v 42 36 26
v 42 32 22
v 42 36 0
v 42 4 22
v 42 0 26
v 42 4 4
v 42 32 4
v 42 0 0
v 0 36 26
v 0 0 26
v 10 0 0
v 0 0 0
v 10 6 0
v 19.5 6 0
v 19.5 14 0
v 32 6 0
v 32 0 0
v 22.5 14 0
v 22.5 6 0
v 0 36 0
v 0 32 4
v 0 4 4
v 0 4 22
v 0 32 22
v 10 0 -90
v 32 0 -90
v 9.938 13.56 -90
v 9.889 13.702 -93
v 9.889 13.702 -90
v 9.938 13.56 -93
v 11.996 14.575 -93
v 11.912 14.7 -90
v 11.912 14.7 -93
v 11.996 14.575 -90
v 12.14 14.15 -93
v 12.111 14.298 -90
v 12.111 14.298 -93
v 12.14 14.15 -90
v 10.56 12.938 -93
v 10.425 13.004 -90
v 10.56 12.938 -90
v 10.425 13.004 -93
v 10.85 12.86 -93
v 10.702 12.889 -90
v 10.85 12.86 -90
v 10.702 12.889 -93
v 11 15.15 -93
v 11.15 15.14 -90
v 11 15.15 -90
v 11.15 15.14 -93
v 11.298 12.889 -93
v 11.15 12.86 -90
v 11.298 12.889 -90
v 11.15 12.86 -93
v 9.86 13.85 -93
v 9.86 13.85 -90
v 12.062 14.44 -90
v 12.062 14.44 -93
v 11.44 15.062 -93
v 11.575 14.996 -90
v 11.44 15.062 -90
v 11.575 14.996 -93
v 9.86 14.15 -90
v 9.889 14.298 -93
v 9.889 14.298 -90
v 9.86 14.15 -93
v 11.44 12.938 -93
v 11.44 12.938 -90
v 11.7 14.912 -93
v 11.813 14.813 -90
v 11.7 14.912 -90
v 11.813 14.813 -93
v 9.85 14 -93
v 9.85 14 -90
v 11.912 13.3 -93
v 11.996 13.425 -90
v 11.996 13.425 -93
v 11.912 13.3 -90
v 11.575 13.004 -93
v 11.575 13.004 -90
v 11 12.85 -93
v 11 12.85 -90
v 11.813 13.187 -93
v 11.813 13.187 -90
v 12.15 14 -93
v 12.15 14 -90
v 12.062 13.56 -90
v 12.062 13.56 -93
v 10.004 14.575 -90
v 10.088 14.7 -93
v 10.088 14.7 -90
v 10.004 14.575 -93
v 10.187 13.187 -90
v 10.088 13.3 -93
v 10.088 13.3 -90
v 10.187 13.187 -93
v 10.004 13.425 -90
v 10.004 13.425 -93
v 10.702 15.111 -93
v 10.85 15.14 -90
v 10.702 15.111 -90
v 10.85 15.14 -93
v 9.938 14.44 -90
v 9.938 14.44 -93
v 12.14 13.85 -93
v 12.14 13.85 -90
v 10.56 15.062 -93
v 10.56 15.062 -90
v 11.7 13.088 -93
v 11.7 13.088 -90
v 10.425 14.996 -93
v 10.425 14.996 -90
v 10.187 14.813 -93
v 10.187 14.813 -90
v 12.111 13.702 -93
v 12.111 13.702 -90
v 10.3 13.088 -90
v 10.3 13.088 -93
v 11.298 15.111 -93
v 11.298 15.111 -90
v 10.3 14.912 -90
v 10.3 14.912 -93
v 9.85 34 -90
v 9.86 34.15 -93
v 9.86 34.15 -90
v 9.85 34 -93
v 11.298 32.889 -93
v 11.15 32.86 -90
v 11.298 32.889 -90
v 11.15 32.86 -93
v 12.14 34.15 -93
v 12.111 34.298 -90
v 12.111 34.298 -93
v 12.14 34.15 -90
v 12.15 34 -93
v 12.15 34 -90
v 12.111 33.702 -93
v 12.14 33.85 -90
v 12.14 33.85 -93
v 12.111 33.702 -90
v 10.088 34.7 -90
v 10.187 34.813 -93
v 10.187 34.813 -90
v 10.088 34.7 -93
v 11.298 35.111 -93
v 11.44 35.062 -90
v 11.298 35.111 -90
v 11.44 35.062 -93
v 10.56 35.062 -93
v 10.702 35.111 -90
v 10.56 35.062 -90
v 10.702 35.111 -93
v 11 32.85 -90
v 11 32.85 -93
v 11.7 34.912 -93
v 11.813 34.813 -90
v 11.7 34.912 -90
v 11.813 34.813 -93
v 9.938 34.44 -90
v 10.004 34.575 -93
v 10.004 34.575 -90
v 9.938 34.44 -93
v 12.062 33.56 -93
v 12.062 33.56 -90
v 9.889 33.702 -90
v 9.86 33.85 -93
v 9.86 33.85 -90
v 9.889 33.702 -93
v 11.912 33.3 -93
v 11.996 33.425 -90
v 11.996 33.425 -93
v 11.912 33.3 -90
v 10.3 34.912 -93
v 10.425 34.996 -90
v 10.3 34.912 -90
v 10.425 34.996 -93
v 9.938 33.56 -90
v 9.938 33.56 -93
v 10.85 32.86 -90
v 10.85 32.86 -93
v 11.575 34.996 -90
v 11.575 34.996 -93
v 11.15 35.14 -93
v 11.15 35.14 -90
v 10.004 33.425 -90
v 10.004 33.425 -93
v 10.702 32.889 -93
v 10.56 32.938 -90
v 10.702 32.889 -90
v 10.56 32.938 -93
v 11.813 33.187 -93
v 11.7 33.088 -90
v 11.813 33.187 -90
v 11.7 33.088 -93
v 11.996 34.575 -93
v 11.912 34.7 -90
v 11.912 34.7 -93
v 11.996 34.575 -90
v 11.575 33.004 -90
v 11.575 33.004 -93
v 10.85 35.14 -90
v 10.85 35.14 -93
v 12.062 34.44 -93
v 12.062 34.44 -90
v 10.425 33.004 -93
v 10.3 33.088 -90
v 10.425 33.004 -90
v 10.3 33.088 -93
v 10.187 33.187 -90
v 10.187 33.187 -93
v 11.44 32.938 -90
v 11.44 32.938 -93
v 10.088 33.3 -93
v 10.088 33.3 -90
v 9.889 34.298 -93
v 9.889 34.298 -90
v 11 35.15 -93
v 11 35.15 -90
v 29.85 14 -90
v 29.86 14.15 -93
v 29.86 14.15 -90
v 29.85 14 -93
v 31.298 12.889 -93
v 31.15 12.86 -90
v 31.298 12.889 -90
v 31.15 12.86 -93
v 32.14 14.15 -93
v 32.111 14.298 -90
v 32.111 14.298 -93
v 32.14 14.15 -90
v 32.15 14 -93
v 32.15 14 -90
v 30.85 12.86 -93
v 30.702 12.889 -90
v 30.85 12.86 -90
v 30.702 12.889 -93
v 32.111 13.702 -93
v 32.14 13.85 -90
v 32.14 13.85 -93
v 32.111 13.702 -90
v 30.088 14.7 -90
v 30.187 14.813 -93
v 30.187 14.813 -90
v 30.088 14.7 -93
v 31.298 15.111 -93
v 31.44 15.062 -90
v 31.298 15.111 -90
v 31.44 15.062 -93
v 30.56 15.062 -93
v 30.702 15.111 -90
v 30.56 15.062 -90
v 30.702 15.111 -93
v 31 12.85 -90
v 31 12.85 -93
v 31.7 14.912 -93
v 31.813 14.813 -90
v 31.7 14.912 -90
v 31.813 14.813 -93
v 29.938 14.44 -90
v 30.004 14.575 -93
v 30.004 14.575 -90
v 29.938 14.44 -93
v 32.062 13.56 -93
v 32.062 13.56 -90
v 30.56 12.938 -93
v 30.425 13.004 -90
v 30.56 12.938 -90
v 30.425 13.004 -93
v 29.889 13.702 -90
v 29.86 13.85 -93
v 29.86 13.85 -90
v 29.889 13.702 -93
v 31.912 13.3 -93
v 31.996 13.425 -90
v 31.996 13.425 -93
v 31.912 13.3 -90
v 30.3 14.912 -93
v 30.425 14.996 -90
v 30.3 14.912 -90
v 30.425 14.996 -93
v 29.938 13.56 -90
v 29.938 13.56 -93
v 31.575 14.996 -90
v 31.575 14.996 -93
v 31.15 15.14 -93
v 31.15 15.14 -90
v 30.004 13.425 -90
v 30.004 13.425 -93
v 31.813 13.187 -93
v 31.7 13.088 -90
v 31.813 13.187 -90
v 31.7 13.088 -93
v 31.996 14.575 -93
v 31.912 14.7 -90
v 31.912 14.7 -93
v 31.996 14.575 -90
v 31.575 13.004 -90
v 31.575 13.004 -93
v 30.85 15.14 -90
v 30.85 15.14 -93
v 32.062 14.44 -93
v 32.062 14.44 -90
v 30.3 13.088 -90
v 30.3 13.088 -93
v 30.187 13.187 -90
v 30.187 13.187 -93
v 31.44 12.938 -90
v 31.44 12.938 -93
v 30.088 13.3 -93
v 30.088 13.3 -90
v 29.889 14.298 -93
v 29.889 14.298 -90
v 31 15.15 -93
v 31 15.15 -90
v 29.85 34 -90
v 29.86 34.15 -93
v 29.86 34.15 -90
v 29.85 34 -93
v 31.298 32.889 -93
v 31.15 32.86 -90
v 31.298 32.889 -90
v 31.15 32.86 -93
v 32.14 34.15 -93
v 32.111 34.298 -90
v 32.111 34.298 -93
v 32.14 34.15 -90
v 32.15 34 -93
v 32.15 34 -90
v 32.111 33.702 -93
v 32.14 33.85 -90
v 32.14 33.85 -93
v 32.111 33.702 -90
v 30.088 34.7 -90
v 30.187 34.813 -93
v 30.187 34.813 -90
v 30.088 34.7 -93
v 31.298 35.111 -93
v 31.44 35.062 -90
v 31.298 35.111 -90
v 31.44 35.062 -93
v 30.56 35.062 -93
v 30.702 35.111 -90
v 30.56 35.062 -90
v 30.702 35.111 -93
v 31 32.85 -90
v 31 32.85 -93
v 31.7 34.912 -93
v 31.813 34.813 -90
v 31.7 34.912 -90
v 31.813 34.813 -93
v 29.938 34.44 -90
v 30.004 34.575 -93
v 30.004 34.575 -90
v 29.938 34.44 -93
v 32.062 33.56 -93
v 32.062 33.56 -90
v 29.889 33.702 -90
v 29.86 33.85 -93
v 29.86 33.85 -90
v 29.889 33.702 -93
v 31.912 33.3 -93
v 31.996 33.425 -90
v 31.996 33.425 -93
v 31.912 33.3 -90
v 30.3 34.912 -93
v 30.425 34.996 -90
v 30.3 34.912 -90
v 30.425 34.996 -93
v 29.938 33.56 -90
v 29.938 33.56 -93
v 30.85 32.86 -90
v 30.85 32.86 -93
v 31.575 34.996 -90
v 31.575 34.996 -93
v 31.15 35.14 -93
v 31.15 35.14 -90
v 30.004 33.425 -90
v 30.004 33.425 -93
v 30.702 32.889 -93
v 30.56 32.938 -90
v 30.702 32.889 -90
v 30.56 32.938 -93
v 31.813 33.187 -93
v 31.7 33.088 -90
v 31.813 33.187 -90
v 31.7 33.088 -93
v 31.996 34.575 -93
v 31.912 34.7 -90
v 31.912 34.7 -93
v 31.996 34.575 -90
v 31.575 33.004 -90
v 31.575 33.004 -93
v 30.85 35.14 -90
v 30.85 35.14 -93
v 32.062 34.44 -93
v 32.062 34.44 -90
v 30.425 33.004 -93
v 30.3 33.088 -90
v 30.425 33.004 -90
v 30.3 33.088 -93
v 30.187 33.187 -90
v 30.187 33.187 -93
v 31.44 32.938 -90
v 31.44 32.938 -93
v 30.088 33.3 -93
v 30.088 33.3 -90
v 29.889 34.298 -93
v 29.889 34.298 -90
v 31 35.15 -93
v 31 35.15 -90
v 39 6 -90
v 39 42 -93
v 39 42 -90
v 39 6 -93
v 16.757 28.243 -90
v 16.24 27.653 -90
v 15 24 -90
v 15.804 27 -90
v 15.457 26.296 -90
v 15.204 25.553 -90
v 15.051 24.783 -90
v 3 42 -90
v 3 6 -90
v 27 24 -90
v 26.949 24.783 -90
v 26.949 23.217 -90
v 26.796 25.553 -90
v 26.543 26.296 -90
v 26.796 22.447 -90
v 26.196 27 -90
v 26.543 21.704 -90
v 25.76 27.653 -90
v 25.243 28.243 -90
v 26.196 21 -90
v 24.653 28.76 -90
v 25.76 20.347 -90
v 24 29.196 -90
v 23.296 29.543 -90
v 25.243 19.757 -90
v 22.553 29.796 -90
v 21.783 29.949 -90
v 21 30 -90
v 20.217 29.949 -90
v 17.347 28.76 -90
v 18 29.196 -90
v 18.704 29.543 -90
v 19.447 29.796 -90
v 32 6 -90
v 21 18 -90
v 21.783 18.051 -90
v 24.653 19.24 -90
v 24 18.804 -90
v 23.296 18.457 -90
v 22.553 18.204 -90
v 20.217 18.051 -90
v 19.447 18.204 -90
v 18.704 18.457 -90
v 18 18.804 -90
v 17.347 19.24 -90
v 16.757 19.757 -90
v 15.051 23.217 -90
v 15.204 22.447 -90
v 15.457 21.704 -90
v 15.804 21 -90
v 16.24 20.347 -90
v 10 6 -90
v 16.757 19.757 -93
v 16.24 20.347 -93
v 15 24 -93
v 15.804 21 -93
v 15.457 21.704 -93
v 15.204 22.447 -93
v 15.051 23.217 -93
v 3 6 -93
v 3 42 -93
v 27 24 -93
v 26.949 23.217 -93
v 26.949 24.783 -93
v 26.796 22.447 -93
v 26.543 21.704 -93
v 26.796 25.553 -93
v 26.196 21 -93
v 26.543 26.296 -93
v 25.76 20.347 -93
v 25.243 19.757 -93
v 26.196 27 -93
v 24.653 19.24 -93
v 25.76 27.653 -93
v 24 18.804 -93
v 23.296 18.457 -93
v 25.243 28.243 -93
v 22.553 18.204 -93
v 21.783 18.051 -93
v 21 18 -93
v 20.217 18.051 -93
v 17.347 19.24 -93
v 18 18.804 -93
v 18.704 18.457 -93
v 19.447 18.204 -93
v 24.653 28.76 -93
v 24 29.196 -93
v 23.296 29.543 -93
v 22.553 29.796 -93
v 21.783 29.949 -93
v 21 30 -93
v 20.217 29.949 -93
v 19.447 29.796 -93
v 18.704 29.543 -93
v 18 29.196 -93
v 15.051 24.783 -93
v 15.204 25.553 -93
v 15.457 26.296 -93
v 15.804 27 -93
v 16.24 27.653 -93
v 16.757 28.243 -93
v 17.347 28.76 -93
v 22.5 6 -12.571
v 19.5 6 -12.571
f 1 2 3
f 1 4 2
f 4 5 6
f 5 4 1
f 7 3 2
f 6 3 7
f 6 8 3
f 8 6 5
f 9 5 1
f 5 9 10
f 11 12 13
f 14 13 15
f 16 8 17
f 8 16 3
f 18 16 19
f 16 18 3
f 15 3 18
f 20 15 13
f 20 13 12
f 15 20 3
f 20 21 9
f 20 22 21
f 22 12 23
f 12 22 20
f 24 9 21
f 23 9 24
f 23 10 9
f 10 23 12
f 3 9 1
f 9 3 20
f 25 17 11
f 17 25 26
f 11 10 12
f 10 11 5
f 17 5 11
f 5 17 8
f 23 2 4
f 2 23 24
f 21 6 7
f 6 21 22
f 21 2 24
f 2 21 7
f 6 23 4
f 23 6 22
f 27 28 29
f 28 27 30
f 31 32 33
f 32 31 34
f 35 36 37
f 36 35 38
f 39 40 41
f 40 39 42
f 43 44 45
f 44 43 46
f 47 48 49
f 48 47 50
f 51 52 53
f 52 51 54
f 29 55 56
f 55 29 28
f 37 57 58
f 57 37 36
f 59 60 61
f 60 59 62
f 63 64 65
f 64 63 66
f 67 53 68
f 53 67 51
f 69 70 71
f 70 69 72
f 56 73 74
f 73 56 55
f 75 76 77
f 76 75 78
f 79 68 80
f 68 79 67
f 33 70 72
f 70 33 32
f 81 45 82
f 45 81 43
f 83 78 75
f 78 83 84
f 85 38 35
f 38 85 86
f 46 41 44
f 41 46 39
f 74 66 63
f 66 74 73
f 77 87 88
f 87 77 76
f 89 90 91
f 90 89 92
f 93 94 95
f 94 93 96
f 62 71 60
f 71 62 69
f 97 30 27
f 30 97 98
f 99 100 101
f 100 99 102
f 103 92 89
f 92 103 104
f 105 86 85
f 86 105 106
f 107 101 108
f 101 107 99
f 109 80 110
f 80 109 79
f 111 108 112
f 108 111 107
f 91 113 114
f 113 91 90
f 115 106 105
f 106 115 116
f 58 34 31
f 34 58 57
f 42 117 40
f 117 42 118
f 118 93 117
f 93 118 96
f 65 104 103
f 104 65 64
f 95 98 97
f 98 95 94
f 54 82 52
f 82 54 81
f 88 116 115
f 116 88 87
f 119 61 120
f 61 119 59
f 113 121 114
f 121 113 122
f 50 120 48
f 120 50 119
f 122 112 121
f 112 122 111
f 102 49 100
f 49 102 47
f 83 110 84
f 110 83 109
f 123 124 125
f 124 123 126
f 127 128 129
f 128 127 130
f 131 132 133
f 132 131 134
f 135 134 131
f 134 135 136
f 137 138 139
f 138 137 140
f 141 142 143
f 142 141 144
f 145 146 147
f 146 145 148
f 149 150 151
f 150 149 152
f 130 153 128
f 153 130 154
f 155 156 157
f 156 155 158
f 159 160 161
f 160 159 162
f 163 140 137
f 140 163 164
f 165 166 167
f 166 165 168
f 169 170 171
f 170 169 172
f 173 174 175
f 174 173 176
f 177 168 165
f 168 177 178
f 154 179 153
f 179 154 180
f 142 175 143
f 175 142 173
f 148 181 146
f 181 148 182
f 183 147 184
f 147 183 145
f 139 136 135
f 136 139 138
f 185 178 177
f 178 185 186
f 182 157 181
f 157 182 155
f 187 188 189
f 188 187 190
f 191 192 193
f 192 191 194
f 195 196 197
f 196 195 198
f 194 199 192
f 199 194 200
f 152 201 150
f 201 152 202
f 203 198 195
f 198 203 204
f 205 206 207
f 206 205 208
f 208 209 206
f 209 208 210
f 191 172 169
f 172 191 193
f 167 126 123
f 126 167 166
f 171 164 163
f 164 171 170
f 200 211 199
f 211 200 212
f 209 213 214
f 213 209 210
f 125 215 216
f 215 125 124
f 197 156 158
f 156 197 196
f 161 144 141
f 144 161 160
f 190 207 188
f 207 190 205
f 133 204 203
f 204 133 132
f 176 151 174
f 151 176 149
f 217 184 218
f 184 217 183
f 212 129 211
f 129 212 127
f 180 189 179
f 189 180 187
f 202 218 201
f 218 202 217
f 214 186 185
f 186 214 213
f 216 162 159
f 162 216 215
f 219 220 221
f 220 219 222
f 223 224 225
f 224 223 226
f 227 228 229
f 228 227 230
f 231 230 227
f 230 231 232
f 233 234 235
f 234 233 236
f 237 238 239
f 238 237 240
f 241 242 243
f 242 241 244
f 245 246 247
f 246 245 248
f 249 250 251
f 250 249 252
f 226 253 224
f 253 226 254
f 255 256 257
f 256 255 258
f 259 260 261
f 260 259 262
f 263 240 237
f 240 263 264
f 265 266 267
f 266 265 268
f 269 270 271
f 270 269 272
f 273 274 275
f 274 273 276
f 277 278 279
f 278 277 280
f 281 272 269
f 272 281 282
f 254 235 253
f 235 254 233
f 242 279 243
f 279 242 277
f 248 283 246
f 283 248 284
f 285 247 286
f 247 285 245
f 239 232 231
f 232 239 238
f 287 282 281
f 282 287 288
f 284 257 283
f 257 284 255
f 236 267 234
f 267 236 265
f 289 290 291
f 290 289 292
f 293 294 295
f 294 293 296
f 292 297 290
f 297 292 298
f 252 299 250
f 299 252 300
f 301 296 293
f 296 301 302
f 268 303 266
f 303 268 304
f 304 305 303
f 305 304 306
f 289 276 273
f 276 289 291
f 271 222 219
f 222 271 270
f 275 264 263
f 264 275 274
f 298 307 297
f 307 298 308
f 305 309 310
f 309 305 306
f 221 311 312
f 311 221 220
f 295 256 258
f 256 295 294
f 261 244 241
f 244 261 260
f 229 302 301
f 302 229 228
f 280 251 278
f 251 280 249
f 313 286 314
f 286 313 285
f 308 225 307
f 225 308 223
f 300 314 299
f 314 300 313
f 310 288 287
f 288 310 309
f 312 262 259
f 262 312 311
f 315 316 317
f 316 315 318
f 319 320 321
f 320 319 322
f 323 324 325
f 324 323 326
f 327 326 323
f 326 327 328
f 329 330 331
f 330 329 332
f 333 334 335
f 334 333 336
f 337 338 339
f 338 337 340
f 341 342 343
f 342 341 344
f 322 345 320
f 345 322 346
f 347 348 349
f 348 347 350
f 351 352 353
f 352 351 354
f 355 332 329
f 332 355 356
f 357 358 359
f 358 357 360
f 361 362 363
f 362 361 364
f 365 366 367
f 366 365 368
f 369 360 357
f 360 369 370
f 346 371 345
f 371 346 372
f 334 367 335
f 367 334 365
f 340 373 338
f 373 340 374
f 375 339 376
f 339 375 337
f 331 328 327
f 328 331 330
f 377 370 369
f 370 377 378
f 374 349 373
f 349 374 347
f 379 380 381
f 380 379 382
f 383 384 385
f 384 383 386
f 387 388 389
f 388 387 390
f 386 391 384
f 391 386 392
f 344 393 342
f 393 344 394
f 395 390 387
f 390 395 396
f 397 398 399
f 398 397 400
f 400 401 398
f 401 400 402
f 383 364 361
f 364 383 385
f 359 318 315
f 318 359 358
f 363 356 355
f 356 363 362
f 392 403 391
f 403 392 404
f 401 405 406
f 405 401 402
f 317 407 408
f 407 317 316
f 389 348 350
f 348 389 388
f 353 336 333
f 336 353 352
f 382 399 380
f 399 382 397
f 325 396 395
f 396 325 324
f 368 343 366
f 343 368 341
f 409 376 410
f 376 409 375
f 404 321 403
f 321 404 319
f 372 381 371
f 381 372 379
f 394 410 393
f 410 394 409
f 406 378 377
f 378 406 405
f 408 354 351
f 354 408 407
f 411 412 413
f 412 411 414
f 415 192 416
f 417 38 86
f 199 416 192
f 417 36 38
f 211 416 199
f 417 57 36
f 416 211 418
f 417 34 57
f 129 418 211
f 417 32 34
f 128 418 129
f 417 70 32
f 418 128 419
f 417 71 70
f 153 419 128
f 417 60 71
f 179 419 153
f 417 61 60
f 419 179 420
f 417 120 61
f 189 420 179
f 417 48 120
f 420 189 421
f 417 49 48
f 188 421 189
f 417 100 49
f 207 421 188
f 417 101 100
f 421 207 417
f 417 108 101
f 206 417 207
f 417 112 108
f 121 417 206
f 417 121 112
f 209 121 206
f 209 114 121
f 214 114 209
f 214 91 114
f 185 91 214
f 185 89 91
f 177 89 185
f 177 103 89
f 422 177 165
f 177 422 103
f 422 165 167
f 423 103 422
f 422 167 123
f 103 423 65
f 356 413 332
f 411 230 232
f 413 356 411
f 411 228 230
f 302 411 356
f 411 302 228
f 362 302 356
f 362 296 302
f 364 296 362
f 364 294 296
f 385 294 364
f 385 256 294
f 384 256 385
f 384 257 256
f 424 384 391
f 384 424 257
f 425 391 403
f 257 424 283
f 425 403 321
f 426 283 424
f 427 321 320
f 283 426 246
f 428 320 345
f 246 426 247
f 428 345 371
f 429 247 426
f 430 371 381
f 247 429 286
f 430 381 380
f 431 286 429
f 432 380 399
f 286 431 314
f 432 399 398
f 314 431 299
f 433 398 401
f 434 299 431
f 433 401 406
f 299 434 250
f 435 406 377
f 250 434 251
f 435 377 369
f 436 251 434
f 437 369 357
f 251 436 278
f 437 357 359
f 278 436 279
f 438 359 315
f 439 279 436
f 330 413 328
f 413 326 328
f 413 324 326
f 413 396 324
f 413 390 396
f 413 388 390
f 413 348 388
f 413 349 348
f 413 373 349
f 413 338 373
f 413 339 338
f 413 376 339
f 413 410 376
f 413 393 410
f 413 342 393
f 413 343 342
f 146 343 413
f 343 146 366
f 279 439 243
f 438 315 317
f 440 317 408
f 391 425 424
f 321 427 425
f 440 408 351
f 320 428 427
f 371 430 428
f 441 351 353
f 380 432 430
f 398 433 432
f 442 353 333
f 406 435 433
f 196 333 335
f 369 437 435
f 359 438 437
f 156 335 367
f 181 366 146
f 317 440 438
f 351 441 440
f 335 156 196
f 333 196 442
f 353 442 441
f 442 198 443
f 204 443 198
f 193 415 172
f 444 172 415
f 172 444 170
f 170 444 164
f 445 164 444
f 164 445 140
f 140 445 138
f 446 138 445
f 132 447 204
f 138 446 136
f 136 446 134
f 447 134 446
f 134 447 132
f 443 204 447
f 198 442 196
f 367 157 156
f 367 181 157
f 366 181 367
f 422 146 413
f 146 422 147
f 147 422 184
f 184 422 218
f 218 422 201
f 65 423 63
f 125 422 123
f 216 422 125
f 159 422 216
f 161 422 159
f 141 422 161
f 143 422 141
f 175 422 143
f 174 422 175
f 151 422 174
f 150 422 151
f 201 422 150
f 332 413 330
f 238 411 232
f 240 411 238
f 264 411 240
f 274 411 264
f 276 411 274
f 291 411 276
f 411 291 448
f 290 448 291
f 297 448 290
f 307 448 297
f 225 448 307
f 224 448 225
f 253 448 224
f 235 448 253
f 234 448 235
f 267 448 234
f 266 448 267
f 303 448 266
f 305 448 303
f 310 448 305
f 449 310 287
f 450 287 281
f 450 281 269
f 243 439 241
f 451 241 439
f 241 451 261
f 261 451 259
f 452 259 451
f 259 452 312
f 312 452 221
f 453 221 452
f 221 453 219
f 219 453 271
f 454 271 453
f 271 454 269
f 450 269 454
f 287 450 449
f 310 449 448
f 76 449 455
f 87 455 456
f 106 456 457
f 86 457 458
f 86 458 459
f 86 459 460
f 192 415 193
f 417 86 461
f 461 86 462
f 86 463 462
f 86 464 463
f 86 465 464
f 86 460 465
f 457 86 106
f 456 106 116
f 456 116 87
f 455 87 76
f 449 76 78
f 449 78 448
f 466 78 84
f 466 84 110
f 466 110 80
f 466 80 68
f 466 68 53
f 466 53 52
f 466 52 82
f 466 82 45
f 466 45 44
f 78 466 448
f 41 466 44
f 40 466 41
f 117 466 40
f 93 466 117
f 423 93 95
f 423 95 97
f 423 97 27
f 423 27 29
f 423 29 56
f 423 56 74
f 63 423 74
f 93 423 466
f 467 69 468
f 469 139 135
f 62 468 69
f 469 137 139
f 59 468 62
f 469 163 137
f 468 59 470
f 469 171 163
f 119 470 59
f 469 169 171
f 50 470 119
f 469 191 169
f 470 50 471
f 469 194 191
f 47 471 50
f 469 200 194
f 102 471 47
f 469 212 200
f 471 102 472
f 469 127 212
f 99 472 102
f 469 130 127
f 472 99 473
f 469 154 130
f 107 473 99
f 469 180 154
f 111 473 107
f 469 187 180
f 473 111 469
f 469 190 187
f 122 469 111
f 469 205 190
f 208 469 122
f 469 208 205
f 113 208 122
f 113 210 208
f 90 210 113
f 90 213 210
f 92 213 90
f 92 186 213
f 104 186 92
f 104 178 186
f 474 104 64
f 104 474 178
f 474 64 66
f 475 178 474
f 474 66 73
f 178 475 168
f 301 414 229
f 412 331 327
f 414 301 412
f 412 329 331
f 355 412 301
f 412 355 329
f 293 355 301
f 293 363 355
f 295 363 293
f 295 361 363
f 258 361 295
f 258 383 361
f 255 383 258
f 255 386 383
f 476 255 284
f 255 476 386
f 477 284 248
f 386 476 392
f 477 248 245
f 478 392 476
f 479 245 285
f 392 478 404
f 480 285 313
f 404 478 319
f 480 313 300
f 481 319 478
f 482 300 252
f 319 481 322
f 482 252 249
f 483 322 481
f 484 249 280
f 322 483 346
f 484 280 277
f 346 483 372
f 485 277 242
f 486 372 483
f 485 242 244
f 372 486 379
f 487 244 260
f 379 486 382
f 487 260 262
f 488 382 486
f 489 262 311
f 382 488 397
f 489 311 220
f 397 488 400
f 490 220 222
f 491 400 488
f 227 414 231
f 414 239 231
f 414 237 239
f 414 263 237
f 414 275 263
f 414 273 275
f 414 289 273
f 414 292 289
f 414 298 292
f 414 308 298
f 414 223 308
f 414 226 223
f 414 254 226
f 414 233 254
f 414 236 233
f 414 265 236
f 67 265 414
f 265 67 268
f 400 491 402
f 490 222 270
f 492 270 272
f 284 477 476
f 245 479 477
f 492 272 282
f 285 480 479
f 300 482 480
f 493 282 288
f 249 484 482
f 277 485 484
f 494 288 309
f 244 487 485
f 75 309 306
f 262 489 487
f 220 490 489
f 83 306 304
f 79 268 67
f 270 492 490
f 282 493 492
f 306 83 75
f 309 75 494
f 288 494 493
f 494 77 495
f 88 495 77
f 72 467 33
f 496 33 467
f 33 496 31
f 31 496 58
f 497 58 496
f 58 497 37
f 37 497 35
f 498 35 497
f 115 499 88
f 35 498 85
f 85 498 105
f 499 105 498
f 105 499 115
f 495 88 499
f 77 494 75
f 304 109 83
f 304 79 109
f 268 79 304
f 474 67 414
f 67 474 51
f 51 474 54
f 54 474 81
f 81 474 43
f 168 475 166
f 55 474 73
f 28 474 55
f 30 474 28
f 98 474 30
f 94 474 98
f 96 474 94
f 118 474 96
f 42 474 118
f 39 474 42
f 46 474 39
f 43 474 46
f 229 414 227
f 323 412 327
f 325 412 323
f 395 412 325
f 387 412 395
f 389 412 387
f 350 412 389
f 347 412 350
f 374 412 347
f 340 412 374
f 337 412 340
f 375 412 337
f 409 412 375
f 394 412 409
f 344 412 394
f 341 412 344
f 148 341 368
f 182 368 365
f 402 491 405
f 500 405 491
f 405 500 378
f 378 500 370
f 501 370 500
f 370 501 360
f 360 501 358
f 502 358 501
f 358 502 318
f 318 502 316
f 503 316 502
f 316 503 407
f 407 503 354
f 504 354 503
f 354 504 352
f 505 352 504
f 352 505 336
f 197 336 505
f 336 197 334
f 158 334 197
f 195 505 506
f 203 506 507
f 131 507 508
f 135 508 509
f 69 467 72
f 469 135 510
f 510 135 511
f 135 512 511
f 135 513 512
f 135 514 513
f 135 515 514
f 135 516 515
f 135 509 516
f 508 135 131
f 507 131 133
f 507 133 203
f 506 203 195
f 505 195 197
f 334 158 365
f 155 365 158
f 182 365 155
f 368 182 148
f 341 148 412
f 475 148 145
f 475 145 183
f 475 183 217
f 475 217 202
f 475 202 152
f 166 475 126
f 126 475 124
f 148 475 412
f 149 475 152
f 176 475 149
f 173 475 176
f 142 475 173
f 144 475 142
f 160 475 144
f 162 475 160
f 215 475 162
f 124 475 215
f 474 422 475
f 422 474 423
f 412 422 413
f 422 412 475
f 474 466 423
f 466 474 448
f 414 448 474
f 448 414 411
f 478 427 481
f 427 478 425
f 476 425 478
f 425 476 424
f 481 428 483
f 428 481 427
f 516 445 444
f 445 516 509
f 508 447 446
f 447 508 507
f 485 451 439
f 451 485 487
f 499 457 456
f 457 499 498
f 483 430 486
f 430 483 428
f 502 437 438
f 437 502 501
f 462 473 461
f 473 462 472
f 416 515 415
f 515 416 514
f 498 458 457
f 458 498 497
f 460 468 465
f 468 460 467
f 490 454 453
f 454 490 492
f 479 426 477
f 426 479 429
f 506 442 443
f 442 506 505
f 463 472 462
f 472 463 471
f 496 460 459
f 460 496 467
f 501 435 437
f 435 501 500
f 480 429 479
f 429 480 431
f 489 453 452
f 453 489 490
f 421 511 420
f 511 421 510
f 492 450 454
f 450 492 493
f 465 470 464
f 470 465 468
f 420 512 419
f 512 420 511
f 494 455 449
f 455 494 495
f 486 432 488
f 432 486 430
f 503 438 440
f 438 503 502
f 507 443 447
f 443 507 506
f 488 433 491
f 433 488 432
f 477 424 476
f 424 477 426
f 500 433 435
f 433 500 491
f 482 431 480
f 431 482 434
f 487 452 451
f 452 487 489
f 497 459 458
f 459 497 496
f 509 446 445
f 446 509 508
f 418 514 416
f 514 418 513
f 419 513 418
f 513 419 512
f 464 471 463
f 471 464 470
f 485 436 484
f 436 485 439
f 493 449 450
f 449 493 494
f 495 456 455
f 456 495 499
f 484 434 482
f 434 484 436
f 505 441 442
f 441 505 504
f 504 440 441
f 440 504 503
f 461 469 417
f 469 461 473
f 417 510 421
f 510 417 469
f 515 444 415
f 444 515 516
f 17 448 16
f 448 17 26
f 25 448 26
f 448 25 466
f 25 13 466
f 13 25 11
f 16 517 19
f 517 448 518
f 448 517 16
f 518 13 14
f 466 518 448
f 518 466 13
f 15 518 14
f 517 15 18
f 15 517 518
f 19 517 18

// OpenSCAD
// METER R모듈 하향 카메라 거치 (기능 출력용 — 꾸미기 전)
// 데드라인: 2026-10-10 까지 IT융합대학 무료 출력 → 동방 픽업 → 검토회의
//
// 의도:
//  - 카메라가 바닥(용기 안)을 내려다보게 고정
//  - D모듈처럼 용기 테두리에 걸치는 클립 + 수직 암
//  - r1=성권 테스트, r2/r3=수혁 담당 보드용 (기구는 동일 계열)
//
// 출력: OpenSCAD → STL → 슬라이서. 필라멘트 PLA 권장.
//   openscad -o r_downward_mount.stl r_module_downward_mount.scad

$fn = 48;

/* ===== 조절 파라미터 (보드·렌즈에 맞게) ===== */
clip_gap      = 18;   // 용기 림 두께 여유 (mm)
clip_depth    = 28;   // 림을 물고 들어가는 깊이
clip_width    = 42;
clip_thick    = 4;

arm_len       = 90;   // 아래로 뻗는 암 길이
arm_thick     = 6;
arm_width     = 22;

cam_plate_w   = 36;   // 카메라 플레이트
cam_plate_h   = 36;
cam_plate_t   = 3;
hole_pitch    = 20;   // M2 홀 간격 (보드에 맞게 수정)
hole_d        = 2.3;

module rim_clip() {
  // ㄷ자 클립 — D모듈 거치와 비슷한 '테두리 걸침'
  difference() {
    cube([clip_width, clip_depth + clip_thick * 2, clip_gap + clip_thick * 2], center = false);
    translate([-1, clip_thick, clip_thick])
      cube([clip_width + 2, clip_depth, clip_gap], center = false);
  }
}

module down_arm() {
  // 클립에서 수직으로 내려가는 암
  translate([clip_width / 2 - arm_width / 2, 0, -(arm_len)])
    cube([arm_width, arm_thick, arm_len]);
}

module camera_plate() {
  // 암이 끝나는 지점에서 바닥을 향하도록 플레이트 (카메라 렌즈 ↓)
  translate([
    clip_width / 2 - cam_plate_w / 2,
    arm_thick,
    -(arm_len + cam_plate_t)
  ])
  difference() {
    cube([cam_plate_w, cam_plate_h, cam_plate_t]);
    // 4홀
    for (x = [cam_plate_w / 2 - hole_pitch / 2, cam_plate_w / 2 + hole_pitch / 2])
      for (y = [cam_plate_h / 2 - hole_pitch / 2, cam_plate_h / 2 + hole_pitch / 2])
        translate([x, y, -1])
          cylinder(h = cam_plate_t + 2, d = hole_d);
    // 렌즈 개구
    translate([cam_plate_w / 2, cam_plate_h / 2, -1])
      cylinder(h = cam_plate_t + 2, d = 12);
  }
}

module brace() {
  // 암-클립 보강 삼각
  translate([clip_width / 2 - 1.5, 0, 0])
    rotate([90, 0, 90])
      linear_extrude(height = 3)
        polygon([[0, 0], [arm_thick + 8, 0], [0, -22]]);
}

union() {
  rim_clip();
  down_arm();
  camera_plate();
  brace();
}

// 미리보기용 안내 텍스트는 STL에 포함하지 않음
echo("METER R downward mount — print by 2026-10-10");
